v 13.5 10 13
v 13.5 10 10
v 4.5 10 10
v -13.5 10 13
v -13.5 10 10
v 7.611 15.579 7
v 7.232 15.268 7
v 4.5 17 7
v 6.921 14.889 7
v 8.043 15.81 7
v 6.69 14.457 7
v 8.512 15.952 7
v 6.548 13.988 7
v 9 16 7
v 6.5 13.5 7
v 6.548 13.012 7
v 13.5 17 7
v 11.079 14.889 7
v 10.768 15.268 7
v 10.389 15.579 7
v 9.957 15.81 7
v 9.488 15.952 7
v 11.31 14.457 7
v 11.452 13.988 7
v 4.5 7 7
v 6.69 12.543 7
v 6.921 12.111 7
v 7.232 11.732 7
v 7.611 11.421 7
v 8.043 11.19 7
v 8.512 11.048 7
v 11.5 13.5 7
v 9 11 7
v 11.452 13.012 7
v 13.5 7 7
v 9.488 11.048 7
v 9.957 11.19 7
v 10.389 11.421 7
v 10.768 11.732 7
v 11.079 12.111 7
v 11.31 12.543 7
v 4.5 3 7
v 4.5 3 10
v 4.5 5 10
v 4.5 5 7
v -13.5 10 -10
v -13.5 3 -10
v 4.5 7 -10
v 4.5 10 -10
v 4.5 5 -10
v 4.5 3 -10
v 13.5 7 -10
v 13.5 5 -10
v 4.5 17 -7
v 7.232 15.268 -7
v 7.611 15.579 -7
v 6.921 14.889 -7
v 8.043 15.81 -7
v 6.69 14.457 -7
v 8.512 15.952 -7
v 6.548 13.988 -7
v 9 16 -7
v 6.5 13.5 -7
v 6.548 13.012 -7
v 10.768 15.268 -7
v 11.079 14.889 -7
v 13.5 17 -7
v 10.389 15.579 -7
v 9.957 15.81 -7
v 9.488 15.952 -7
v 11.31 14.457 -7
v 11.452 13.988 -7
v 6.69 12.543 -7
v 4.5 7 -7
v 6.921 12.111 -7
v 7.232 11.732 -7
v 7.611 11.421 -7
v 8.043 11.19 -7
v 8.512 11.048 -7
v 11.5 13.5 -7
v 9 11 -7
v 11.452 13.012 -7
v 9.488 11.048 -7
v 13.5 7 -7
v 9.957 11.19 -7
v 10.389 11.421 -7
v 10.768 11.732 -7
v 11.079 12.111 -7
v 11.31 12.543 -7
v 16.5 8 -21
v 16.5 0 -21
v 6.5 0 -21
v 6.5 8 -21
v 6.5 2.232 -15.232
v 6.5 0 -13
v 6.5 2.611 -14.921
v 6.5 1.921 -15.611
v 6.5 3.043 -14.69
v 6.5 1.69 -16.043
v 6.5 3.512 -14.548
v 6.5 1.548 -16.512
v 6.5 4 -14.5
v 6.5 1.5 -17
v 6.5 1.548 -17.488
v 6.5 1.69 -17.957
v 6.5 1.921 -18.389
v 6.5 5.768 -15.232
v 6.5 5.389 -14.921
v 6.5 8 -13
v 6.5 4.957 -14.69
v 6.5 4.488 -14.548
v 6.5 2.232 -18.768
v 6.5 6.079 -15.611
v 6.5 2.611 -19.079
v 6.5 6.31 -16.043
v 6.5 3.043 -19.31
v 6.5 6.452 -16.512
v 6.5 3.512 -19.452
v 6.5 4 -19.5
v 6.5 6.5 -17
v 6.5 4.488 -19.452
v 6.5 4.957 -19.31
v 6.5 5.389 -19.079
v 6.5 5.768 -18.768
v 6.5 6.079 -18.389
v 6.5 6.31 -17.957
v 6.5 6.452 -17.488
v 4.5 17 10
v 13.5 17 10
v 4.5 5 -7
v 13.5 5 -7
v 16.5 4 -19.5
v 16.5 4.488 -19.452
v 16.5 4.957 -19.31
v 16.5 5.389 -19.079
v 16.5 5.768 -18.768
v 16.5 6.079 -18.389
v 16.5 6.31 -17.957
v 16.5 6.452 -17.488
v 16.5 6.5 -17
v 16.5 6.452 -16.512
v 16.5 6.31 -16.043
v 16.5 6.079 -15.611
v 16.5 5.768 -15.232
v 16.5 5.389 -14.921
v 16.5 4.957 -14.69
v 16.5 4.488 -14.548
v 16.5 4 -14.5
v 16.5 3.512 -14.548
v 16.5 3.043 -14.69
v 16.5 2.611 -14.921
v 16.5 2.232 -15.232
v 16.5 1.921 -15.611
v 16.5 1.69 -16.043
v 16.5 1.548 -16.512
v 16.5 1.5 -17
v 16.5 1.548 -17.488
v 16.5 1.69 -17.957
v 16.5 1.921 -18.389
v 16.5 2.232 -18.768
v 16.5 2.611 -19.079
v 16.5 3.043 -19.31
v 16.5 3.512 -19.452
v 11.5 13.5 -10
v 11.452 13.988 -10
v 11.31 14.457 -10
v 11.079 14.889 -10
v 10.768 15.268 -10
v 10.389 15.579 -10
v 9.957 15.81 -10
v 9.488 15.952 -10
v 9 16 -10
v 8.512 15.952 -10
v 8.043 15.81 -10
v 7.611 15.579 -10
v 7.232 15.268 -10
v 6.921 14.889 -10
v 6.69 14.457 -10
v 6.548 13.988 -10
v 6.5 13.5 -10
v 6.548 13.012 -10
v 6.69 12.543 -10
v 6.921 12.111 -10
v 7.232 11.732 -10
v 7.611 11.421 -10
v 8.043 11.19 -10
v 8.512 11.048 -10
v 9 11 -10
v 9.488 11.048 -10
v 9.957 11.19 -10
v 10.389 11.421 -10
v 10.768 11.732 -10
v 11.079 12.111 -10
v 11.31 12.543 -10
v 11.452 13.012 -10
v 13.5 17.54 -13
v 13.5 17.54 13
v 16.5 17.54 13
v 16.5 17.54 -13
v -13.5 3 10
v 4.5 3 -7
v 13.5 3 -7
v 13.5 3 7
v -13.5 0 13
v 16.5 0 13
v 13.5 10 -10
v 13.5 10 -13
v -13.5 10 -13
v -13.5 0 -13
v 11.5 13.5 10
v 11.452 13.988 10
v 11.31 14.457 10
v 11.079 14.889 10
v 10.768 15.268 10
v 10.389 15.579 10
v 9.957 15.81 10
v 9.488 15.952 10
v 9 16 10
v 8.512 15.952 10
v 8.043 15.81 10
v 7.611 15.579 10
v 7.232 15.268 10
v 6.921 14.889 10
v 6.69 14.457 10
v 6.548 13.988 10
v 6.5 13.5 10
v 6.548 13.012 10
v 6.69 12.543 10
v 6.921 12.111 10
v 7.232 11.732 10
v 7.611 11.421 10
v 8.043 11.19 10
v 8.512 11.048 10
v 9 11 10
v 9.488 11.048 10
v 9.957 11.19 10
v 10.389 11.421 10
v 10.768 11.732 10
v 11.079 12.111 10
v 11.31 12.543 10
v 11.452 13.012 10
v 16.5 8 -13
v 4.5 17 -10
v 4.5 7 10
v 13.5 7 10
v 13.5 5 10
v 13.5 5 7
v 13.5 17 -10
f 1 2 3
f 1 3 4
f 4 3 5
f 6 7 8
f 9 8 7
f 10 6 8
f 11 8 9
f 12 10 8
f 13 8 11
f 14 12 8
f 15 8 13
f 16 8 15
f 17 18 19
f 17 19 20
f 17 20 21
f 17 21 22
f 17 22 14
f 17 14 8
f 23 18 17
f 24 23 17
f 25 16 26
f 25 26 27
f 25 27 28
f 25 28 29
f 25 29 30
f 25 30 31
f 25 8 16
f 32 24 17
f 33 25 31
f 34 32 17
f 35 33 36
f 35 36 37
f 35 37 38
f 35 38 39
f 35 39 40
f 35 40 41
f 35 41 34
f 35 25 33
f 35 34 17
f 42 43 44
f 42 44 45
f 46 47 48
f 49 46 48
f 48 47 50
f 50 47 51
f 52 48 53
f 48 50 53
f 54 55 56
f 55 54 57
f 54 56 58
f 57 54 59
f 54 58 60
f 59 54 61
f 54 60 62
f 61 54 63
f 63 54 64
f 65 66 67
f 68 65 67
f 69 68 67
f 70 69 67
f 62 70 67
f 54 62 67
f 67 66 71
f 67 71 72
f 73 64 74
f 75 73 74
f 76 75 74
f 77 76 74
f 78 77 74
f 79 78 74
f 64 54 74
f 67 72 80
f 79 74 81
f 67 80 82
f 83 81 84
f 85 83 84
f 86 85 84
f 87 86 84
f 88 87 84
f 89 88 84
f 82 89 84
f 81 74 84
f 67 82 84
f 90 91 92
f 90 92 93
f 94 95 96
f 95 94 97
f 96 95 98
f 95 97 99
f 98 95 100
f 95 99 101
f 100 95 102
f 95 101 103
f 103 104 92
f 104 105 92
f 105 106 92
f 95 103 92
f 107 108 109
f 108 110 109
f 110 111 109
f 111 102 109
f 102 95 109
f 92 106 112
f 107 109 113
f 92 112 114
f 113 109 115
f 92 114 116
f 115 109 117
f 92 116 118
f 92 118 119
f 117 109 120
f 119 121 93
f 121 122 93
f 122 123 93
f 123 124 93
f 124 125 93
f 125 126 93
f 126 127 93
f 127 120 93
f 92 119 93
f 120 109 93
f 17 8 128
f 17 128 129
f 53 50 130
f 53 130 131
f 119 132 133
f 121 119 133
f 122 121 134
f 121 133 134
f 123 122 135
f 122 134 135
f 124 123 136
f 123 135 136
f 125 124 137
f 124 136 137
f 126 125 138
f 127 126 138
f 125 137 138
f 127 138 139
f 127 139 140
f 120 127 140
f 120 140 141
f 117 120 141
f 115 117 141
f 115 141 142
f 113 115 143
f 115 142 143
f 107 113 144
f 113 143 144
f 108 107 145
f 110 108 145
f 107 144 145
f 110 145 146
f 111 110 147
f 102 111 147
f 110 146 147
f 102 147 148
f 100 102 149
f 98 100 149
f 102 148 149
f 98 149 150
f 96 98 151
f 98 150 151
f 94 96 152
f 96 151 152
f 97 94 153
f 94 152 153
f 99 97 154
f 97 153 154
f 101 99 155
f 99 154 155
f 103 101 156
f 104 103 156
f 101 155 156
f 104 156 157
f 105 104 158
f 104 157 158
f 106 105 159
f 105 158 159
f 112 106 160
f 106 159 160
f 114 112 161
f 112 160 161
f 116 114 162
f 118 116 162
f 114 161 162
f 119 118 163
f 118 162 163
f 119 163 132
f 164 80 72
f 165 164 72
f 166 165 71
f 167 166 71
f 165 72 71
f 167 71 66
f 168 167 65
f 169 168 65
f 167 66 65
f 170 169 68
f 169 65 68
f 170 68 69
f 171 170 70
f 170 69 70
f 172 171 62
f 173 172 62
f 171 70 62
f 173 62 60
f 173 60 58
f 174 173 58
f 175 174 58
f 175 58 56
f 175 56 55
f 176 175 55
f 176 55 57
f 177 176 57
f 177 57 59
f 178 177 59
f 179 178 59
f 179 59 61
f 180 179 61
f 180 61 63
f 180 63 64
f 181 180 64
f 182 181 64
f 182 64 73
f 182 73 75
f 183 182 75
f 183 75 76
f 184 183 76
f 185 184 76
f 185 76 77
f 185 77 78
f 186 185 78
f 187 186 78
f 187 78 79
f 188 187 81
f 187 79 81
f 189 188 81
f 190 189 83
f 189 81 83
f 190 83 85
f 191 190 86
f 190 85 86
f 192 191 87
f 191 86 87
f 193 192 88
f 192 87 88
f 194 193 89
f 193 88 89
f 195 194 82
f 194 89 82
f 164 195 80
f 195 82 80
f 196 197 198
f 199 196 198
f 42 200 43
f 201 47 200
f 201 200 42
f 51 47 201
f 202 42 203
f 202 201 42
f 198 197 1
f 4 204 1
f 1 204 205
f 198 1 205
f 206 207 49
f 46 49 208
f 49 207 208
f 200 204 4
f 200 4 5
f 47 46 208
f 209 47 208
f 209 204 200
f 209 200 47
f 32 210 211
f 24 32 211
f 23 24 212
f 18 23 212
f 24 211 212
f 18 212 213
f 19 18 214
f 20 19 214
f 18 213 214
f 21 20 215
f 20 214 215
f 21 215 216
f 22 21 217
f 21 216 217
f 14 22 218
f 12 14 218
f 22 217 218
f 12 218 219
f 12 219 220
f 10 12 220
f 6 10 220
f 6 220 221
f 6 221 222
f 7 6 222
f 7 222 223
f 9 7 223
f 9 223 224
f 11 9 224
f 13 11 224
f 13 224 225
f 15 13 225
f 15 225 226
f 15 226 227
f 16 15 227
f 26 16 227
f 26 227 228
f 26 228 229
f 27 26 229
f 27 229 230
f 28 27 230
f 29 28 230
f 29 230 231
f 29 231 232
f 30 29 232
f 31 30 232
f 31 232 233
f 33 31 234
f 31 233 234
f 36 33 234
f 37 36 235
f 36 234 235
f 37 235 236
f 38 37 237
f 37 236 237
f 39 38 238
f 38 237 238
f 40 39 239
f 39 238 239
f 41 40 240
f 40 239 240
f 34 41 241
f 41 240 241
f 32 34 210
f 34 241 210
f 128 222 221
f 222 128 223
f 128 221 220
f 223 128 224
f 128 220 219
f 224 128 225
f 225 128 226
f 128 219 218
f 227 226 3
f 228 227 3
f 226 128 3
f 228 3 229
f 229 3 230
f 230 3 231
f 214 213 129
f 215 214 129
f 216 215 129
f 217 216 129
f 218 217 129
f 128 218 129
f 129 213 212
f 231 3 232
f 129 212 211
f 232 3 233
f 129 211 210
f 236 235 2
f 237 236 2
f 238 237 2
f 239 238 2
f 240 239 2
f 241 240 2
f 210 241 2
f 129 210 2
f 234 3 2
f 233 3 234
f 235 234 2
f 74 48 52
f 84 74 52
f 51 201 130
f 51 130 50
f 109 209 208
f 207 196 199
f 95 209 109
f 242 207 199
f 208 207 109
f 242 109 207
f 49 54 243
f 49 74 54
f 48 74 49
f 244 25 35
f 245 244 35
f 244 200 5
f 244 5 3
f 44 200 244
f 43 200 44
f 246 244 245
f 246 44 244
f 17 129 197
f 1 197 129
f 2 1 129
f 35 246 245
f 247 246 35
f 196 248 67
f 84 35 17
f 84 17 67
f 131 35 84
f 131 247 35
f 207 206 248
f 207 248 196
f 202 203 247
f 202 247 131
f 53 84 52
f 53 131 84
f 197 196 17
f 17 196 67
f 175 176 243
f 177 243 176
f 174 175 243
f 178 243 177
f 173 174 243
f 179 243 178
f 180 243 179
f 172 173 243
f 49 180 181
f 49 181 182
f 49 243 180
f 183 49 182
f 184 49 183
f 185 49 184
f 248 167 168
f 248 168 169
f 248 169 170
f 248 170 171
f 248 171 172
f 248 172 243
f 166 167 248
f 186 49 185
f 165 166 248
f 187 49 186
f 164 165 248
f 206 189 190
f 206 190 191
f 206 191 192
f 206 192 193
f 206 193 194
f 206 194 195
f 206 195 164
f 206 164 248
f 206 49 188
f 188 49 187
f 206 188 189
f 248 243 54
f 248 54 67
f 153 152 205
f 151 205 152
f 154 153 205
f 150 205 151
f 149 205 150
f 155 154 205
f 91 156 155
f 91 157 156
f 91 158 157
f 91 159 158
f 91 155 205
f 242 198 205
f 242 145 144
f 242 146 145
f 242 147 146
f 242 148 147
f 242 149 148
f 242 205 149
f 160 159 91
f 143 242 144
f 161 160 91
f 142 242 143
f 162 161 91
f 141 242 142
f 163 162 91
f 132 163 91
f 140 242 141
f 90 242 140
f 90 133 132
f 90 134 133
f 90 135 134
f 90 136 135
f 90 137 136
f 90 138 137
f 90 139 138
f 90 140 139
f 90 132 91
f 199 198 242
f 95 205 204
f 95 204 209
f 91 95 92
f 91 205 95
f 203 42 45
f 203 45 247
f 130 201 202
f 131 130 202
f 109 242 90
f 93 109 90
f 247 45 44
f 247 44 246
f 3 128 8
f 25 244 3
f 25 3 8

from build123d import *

# Parameters (mm, degrees)
SKETCH1_W               = 27
SKETCH1_H               = 20
SKETCH1_W_2             = 9
SKETCH1_H_2             = 3
BOSS_EXTRUDE1_DEPTH     = 3
BOSS_EXTRUDE2_START     = 3
SKETCH1_4_W             = 9
SKETCH1_4_H             = 3
BOSS_EXTRUDE2_DEPTH     = 4
SKETCH2_W               = 9
SKETCH2_H               = 6
BOSS_EXTRUDE3_DEPTH     = 3
BOSS_EXTRUDE4_START     = -4
SKETCH2_2_W             = 9
SKETCH2_2_H             = 6
BOSS_EXTRUDE4_DEPTH     = 2
SKETCH1_5_W             = 18
SKETCH1_5_H             = 3
BOSS_EXTRUDE5_DEPTH     = 10
SKETCH3_W               = 3
SKETCH3_H               = 26
BOSS_EXTRUDE6_DEPTH     = 7.54
SKETCH4_W               = 9
SKETCH4_H               = 3
BOSS_EXTRUDE7_DEPTH     = 7
SKETCH5_R               = 2.5
CUT_EXTRUDE1_DEPTH      = 4
CUT_EXTRUDE1_DEPTH_BACK = 24
SKETCH6_W               = 8
SKETCH6_H               = 8
SKETCH6_R               = 2.5
BOSS_EXTRUDE8_DEPTH     = 10


with BuildPart() as part:
    # Sketch1 → Boss-Extrude1 (new body)
    with BuildSketch(Plane(origin=(0, 0, 0), x_dir=(1, 0, 0), z_dir=(0, 1, 0))):
        Rectangle(SKETCH1_W, SKETCH1_H)
        with Locations((9, 11.5)):
            Rectangle(SKETCH1_W_2, SKETCH1_H_2)
        with Locations((9, -11.5)):
            Rectangle(SKETCH1_W_2, SKETCH1_H_2)
    extrude(amount=BOSS_EXTRUDE1_DEPTH)

    # Sketch1<4> → Boss-Extrude2 (add)
    with BuildSketch(Plane(origin=(0, 0, 0), x_dir=(1, 0, 0), z_dir=(0, 1, 0)).offset(BOSS_EXTRUDE2_START)):
        with Locations((9, -11.5)):
            Rectangle(SKETCH1_4_W, SKETCH1_4_H)
        with Locations((9, 11.5)):
            Rectangle(SKETCH1_4_W, SKETCH1_4_H)
    extrude(amount=BOSS_EXTRUDE2_DEPTH)

    # Sketch2 → Boss-Extrude3 (add)
    with BuildSketch(Plane(origin=(0, 7, 0), x_dir=(1, 0, 0), z_dir=(0, 1, 0))):
        with Locations((9, -10)):
            Rectangle(SKETCH2_W, SKETCH2_H)
        with Locations((9, 10)):
            Rectangle(SKETCH2_W, SKETCH2_H)
    extrude(amount=BOSS_EXTRUDE3_DEPTH)

    # Sketch2<2> → Boss-Extrude4 (add)
    with BuildSketch(Plane(origin=(0, 7, 0), x_dir=(1, 0, 0), z_dir=(0, 1, 0)).offset(BOSS_EXTRUDE4_START)):
        with Locations((9, -10)):
            Rectangle(SKETCH2_2_W, SKETCH2_2_H)
        with Locations((9, 10)):
            Rectangle(SKETCH2_2_W, SKETCH2_2_H)
    extrude(amount=BOSS_EXTRUDE4_DEPTH)

    # Sketch1<5> → Boss-Extrude5 (add)
    with BuildSketch(Plane(origin=(0, 0, 0), x_dir=(1, 0, 0), z_dir=(0, 1, 0))):
        Polygon((16.5, -13), (13.5, -13), (13.5, -10), (13.5, 10), (13.5, 13), (16.5, 13), align=None)
        with Locations((-4.5, -11.5)):
            Rectangle(SKETCH1_5_W, SKETCH1_5_H)
        with Locations((-4.5, 11.5)):
            Rectangle(SKETCH1_5_W, SKETCH1_5_H)
    extrude(amount=BOSS_EXTRUDE5_DEPTH)

    # Sketch3 → Boss-Extrude6 (add)
    with BuildSketch(Plane(origin=(0, 10, 0), x_dir=(1, 0, 0), z_dir=(0, 1, 0))):
        with Locations((15, 0)):
            Rectangle(SKETCH3_W, SKETCH3_H)
    extrude(amount=BOSS_EXTRUDE6_DEPTH)

    # Sketch4 → Boss-Extrude7 (add)
    with BuildSketch(Plane(origin=(0, 10, 0), x_dir=(1, 0, 0), z_dir=(0, 1, 0))):
        with Locations((9, 8.5)):
            Rectangle(SKETCH4_W, SKETCH4_H)
        with Locations((9, -8.5)):
            Rectangle(SKETCH4_W, SKETCH4_H)
    extrude(amount=BOSS_EXTRUDE7_DEPTH)

    # Sketch5 → Cut-Extrude1 (cut, two sides)
    with BuildSketch(Plane.XY.offset(10)) as cut_extrude1_sk:
        with Locations((9, 13.5)):
            Circle(SKETCH5_R)
    extrude(amount=CUT_EXTRUDE1_DEPTH, mode=Mode.SUBTRACT)
    extrude(cut_extrude1_sk.sketch, amount=-CUT_EXTRUDE1_DEPTH_BACK, mode=Mode.SUBTRACT)

    # Sketch6 → Boss-Extrude8 (add)
    with BuildSketch(Plane(origin=(16.5, 0, 0), x_dir=(0, 0, -1), z_dir=(1, 0, 0))):
        with Locations((17, 4)):
            Rectangle(SKETCH6_W, SKETCH6_H)
        with Locations((17, 4)):
            Circle(SKETCH6_R, mode=Mode.SUBTRACT)
    extrude(amount=-BOSS_EXTRUDE8_DEPTH)


solid = part.part
